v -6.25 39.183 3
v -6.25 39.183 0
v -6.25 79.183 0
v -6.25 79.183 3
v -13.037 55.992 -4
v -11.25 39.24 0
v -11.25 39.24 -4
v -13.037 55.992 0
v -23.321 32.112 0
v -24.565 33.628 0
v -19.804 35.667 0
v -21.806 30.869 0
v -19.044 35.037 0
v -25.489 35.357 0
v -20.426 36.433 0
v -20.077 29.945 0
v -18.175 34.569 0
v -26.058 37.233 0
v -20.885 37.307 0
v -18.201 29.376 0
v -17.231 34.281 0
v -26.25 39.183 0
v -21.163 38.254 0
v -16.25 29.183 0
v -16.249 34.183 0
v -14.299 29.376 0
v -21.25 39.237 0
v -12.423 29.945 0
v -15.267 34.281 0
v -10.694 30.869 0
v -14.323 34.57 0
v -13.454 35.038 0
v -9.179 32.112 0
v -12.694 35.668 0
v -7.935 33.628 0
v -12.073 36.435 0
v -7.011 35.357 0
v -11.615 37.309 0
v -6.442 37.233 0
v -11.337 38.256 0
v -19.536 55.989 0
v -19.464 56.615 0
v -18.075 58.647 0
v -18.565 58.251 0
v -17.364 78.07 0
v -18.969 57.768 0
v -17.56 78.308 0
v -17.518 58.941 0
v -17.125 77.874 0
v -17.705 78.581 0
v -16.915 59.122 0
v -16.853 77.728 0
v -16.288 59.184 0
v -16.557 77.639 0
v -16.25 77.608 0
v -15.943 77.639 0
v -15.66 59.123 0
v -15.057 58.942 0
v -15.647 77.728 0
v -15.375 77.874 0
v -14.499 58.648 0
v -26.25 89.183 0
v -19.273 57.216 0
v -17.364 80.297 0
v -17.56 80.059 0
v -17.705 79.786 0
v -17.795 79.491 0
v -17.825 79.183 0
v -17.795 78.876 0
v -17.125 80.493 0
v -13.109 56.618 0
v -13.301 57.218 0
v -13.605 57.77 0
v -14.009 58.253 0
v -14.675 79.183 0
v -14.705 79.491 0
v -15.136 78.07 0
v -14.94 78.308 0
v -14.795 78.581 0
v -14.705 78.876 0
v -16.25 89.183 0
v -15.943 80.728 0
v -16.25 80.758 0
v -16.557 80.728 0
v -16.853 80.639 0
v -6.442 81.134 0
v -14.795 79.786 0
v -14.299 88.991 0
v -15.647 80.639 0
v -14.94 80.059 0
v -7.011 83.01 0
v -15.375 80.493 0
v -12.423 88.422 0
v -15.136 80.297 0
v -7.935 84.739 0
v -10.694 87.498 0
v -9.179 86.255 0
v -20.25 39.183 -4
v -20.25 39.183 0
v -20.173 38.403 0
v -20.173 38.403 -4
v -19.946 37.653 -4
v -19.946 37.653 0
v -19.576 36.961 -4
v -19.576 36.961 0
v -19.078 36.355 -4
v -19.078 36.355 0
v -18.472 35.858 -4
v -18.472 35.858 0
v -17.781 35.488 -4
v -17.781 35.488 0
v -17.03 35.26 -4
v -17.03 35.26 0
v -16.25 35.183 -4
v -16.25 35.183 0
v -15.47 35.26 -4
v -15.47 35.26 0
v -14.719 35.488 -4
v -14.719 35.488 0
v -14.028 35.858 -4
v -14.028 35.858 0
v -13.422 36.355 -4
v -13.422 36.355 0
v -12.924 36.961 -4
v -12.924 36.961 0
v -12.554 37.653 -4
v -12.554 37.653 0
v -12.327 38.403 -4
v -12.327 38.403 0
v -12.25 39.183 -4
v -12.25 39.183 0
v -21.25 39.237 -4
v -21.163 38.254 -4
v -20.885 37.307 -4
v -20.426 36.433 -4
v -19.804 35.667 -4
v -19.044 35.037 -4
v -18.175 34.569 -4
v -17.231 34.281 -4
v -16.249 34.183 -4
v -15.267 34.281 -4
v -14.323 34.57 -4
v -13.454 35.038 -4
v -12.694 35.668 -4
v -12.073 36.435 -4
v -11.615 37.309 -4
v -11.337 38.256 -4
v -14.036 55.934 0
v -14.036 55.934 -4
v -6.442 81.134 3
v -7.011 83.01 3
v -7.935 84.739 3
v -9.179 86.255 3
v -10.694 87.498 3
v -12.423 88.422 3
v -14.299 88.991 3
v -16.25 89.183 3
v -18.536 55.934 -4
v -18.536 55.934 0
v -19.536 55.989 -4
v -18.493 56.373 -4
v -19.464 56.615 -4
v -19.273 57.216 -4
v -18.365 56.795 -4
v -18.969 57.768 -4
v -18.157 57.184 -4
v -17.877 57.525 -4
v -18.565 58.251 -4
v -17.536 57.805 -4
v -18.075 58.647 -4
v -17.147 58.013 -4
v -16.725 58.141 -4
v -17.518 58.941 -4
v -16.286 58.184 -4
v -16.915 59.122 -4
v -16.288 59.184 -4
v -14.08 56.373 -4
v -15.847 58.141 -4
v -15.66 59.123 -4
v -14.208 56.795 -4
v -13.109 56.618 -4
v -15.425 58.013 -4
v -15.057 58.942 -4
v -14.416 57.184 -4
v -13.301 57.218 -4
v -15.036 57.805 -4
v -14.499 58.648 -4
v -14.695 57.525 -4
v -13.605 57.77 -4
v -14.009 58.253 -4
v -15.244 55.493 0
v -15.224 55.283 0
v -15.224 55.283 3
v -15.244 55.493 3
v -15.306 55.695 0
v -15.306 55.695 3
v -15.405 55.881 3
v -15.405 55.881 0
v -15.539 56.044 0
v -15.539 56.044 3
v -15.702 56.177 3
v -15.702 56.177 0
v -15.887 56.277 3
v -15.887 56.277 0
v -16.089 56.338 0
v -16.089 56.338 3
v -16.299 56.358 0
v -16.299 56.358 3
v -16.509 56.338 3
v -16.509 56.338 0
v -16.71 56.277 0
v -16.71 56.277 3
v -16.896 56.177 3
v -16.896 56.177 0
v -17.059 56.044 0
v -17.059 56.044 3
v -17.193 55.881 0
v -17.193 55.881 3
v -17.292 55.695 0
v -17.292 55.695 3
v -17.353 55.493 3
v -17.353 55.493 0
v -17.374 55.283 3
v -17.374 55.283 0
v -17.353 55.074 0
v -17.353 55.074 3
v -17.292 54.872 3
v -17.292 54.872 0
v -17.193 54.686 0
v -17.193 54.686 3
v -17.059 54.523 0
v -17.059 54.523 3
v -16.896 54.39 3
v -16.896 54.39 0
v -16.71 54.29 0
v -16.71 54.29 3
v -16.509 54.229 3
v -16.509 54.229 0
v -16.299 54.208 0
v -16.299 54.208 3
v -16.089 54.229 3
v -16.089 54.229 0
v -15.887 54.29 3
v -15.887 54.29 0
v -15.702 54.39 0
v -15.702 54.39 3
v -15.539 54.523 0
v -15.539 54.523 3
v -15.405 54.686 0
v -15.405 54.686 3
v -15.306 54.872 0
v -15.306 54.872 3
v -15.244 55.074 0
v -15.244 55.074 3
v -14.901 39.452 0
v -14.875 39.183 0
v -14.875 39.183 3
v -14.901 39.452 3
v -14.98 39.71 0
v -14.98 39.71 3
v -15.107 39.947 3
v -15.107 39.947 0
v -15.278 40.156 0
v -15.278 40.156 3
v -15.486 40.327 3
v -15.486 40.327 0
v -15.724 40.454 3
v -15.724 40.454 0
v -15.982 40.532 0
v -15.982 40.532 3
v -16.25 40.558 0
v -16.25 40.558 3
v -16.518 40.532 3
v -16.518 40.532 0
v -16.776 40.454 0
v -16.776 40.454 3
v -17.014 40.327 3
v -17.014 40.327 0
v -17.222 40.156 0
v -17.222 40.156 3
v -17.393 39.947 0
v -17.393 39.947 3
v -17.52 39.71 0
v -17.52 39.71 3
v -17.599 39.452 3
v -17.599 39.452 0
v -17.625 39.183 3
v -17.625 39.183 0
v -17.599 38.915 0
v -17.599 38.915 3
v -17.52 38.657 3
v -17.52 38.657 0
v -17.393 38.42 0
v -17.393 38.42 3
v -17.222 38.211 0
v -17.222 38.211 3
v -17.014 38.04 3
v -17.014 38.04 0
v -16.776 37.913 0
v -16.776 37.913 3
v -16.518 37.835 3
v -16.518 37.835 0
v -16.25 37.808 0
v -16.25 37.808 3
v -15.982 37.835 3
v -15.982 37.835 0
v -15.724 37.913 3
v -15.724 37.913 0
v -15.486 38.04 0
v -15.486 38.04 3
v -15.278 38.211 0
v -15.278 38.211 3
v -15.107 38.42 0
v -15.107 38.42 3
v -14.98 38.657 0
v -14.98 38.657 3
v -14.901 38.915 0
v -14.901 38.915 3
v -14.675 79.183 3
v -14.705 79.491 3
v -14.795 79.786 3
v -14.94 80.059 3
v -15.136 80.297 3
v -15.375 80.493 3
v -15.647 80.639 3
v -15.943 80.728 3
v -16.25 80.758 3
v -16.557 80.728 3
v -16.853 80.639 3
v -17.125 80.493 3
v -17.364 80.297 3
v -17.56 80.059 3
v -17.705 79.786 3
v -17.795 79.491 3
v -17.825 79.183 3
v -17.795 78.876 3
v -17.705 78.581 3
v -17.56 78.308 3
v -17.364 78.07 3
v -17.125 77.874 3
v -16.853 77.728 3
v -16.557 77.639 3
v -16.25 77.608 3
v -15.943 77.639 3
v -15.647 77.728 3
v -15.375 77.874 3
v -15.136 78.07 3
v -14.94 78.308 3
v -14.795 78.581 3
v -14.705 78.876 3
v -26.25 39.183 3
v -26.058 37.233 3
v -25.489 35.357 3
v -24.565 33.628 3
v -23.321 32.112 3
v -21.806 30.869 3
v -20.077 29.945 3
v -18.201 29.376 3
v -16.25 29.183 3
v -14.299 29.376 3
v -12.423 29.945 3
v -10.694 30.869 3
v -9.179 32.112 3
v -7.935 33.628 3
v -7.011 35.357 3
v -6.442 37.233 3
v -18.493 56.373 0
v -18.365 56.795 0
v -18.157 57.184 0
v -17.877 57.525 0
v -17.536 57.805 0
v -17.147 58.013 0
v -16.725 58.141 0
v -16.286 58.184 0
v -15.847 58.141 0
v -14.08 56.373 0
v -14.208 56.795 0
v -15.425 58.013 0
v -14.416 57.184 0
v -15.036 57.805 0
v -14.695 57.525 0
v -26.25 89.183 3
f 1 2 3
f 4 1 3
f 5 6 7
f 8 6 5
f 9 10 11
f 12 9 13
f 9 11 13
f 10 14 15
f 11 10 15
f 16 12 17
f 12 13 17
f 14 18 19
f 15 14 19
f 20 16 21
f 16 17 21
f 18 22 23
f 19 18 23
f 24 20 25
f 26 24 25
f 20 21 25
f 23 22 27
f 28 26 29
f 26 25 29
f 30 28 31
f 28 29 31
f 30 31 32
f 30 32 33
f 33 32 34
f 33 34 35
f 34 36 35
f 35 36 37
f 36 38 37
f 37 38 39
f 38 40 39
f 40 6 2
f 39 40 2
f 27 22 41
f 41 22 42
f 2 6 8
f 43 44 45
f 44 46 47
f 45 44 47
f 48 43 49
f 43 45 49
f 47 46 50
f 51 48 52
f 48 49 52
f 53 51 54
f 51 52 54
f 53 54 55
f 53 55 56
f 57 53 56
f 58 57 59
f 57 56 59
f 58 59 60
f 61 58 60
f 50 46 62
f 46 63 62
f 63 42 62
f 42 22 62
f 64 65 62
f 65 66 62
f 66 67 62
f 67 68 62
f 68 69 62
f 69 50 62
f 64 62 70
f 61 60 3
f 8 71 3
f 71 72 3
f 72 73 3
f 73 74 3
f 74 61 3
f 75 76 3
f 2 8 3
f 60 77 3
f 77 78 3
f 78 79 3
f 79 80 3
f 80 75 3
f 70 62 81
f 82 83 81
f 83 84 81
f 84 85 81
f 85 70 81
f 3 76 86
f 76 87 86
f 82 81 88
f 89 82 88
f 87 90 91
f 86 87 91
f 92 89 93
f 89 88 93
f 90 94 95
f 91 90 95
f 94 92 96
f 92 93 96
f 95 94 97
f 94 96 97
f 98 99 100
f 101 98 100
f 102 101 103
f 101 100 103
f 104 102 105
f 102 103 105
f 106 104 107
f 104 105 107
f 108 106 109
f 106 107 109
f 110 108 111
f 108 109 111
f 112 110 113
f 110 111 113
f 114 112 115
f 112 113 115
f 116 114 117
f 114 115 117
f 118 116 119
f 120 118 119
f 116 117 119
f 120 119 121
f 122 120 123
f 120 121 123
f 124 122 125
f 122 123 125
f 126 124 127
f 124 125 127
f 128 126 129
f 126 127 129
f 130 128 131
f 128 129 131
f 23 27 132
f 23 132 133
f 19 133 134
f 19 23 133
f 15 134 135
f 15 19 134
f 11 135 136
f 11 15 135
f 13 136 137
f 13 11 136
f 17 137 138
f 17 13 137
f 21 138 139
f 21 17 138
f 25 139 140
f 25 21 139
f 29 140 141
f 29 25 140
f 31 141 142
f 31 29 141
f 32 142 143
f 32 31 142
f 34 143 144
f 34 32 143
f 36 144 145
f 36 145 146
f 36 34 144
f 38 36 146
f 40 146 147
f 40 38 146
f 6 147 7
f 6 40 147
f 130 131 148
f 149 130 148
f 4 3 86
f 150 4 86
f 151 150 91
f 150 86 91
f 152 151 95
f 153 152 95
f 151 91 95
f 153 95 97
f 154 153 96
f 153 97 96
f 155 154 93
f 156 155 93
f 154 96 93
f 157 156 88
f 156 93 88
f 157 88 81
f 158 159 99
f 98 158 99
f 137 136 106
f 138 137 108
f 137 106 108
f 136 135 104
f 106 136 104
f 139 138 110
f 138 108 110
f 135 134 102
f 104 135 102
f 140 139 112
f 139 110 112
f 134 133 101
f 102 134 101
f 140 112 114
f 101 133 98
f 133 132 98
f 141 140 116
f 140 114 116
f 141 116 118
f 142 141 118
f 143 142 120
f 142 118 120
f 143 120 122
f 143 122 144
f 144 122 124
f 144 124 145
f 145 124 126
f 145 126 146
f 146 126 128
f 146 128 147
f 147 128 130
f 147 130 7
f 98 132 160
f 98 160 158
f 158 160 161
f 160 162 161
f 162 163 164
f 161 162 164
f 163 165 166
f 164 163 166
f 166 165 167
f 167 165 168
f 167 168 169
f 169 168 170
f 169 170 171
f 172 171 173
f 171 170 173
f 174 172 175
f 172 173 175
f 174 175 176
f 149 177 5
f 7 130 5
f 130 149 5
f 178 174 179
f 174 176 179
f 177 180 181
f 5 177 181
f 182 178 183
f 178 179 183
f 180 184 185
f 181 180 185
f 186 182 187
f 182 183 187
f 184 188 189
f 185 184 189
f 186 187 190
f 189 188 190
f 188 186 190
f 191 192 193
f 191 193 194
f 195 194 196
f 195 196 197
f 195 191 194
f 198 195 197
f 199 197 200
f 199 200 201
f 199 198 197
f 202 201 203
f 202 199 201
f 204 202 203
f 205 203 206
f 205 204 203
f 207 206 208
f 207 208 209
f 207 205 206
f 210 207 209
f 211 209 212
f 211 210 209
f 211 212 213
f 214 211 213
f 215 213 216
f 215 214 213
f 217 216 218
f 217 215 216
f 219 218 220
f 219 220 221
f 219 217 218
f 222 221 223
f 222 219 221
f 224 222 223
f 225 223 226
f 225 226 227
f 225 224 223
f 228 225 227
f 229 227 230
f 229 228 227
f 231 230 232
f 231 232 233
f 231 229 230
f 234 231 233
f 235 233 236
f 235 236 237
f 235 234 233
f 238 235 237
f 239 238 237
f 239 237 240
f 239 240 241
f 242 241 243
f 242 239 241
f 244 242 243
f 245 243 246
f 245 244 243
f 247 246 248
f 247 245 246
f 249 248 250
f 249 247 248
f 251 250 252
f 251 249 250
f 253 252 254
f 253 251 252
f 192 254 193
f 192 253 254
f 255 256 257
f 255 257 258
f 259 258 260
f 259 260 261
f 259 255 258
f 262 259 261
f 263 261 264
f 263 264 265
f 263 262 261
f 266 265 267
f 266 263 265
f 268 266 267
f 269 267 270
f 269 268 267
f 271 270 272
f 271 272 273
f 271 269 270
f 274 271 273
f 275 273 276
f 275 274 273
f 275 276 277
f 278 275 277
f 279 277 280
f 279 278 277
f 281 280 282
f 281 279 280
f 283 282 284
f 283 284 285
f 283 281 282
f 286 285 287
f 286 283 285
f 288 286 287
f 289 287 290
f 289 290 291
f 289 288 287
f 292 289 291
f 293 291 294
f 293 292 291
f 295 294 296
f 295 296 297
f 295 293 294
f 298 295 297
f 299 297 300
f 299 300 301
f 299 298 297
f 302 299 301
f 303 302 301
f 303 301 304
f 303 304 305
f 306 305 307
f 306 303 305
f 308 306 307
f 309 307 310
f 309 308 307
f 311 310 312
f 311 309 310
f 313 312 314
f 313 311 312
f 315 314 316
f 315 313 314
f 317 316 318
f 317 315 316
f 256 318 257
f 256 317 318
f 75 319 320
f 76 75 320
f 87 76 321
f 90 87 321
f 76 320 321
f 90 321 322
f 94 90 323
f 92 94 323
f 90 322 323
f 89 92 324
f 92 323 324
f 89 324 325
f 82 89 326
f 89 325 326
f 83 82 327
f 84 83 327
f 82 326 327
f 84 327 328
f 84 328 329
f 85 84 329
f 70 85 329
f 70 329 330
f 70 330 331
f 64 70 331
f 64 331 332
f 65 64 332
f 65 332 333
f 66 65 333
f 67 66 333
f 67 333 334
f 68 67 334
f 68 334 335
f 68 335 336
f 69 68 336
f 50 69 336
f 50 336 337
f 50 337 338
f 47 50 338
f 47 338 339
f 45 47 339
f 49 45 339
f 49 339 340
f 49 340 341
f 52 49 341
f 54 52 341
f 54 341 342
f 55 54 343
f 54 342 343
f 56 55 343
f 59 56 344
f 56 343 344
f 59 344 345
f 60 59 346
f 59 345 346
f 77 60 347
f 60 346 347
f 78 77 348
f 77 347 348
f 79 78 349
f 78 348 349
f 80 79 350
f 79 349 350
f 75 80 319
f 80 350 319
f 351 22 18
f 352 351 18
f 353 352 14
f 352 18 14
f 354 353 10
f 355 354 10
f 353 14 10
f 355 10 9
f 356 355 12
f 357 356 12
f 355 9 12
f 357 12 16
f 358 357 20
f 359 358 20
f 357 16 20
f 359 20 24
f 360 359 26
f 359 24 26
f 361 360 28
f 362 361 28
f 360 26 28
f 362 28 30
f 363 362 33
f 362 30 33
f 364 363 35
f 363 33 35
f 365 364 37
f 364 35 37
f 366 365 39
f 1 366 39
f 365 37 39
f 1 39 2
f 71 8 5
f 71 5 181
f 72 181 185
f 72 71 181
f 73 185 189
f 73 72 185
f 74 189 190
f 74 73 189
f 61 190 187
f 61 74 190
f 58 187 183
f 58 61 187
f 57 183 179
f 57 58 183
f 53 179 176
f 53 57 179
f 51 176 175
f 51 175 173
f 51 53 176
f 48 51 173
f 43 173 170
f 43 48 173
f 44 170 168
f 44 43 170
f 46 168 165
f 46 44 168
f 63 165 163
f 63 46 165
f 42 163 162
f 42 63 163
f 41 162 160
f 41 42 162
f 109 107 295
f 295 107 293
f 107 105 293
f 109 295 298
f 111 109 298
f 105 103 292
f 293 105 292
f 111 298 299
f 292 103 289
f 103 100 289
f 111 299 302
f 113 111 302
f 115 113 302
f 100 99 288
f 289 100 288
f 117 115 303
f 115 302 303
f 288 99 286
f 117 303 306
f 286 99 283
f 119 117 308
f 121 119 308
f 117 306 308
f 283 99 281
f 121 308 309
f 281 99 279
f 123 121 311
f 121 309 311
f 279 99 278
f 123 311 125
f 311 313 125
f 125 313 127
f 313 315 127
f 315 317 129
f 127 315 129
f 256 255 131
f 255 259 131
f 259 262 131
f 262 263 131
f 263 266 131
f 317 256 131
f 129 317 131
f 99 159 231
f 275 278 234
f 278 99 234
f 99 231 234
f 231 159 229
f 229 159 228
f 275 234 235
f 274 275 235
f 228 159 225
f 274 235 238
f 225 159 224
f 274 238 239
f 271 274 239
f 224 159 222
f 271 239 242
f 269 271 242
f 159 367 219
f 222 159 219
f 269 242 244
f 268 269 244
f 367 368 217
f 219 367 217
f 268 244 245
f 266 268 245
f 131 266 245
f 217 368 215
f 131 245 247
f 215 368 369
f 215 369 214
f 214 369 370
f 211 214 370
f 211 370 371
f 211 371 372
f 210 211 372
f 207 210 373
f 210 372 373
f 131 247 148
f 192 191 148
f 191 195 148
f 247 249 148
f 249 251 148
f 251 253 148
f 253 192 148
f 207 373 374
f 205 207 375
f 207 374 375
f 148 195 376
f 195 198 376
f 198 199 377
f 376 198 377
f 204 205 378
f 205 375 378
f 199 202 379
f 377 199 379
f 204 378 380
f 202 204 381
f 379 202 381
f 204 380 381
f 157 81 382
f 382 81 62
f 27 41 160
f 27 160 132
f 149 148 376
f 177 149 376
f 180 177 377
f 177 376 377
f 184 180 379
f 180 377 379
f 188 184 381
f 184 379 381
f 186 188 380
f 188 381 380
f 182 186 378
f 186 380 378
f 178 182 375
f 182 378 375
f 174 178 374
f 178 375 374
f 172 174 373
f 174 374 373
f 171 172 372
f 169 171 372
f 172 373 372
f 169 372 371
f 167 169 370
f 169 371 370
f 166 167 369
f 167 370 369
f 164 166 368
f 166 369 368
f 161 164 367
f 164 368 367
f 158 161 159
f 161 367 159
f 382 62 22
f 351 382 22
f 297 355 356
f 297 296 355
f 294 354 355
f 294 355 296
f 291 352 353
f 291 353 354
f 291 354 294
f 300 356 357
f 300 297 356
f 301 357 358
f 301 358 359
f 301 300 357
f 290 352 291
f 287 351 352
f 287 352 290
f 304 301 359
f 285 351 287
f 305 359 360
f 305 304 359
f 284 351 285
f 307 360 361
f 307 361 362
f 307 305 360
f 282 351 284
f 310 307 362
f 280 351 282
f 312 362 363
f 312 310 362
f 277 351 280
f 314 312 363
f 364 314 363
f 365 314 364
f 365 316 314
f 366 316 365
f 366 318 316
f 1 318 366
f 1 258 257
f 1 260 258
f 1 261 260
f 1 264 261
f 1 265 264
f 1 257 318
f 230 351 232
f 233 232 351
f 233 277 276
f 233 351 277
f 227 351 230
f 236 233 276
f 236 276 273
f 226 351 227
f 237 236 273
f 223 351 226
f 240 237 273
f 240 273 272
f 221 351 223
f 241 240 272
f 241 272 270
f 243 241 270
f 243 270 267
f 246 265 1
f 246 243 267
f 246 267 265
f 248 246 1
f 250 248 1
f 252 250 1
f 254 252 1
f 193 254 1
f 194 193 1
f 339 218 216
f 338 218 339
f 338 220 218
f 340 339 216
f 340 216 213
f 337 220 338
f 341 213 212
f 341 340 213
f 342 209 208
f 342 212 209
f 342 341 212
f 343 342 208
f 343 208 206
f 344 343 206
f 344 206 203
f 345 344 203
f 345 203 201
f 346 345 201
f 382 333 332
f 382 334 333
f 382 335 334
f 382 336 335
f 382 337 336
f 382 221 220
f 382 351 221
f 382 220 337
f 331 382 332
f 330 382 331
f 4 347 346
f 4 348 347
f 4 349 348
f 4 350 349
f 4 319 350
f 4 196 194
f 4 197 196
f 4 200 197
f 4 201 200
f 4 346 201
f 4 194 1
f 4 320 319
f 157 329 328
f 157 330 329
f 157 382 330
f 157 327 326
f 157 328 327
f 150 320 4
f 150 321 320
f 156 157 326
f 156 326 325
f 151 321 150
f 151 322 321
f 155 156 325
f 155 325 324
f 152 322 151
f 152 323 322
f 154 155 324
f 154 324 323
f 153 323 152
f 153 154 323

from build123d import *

# Parameters (mm, degrees)
SKETCH1_R           = 1.075
SKETCH1_R_2         = 1.375
BOSS_EXTRUDE1_DEPTH = 3
BOSS_EXTRUDE2_DEPTH = 4
SKETCH3_R           = 1.575
CUT_EXTRUDE1_DEPTH  = 10


with BuildPart() as part:
    # Sketch1 → Boss-Extrude1 (new body)
    with BuildSketch(Plane.XY):
        with BuildLine():
            Line((-26.25, 89.183481687), (-26.25, 39.183481687))
            ThreePointArc((-26.25, 39.183481687), (-16.25, 29.183481687), (-6.25, 39.183481687))
            Line((-6.25, 39.183481687), (-6.25, 79.183481687))
            ThreePointArc((-6.25, 79.183481687), (-9.178932188, 86.254549499), (-16.25, 89.183481687))
            Line((-16.25, 89.183481687), (-26.25, 89.183481687))
        make_face()
        with Locations((-16.298780591, 55.283407788)):
            Circle(SKETCH1_R, mode=Mode.SUBTRACT)
        with Locations((-16.25, 39.183481687)):
            Circle(SKETCH1_R_2, mode=Mode.SUBTRACT)
    extrude(amount=BOSS_EXTRUDE1_DEPTH)

    # Sketch1<4> → Boss-Extrude2 (add)
    with BuildSketch(Plane.XY):
        with BuildLine():
            ThreePointArc((-13.036870696, 55.991806015), (-16.287526809, 59.183775163), (-19.535875527, 55.989457894))
            Line((-19.535875527, 55.989457894), (-21.249709959, 39.23733634))
            ThreePointArc((-21.249709959, 39.23733634), (-16.248864162, 34.183481816), (-11.250315025, 39.239607879))
            Line((-11.250315025, 39.239607879), (-13.036870696, 55.991806015))
        make_face()
        with BuildLine():
            Line((-20.25, 39.183481687), (-18.536352569, 55.933775375))
            ThreePointArc((-18.536352569, 55.933775375), (-16.286352569, 58.183775375), (-14.036352569, 55.933775375))
            Line((-14.036352569, 55.933775375), (-12.25, 39.183481687))
            ThreePointArc((-12.25, 39.183481687), (-16.25, 35.183481687), (-20.25, 39.183481687))
        make_face(mode=Mode.SUBTRACT)
    extrude(amount=-BOSS_EXTRUDE2_DEPTH)

    # Sketch3 → Cut-Extrude1 (cut)
    with BuildSketch(Plane.XY.offset(3)):
        with Locations((-16.25, 79.183481687)):
            Circle(SKETCH3_R)
    extrude(amount=-CUT_EXTRUDE1_DEPTH, mode=Mode.SUBTRACT)


solid = part.part
